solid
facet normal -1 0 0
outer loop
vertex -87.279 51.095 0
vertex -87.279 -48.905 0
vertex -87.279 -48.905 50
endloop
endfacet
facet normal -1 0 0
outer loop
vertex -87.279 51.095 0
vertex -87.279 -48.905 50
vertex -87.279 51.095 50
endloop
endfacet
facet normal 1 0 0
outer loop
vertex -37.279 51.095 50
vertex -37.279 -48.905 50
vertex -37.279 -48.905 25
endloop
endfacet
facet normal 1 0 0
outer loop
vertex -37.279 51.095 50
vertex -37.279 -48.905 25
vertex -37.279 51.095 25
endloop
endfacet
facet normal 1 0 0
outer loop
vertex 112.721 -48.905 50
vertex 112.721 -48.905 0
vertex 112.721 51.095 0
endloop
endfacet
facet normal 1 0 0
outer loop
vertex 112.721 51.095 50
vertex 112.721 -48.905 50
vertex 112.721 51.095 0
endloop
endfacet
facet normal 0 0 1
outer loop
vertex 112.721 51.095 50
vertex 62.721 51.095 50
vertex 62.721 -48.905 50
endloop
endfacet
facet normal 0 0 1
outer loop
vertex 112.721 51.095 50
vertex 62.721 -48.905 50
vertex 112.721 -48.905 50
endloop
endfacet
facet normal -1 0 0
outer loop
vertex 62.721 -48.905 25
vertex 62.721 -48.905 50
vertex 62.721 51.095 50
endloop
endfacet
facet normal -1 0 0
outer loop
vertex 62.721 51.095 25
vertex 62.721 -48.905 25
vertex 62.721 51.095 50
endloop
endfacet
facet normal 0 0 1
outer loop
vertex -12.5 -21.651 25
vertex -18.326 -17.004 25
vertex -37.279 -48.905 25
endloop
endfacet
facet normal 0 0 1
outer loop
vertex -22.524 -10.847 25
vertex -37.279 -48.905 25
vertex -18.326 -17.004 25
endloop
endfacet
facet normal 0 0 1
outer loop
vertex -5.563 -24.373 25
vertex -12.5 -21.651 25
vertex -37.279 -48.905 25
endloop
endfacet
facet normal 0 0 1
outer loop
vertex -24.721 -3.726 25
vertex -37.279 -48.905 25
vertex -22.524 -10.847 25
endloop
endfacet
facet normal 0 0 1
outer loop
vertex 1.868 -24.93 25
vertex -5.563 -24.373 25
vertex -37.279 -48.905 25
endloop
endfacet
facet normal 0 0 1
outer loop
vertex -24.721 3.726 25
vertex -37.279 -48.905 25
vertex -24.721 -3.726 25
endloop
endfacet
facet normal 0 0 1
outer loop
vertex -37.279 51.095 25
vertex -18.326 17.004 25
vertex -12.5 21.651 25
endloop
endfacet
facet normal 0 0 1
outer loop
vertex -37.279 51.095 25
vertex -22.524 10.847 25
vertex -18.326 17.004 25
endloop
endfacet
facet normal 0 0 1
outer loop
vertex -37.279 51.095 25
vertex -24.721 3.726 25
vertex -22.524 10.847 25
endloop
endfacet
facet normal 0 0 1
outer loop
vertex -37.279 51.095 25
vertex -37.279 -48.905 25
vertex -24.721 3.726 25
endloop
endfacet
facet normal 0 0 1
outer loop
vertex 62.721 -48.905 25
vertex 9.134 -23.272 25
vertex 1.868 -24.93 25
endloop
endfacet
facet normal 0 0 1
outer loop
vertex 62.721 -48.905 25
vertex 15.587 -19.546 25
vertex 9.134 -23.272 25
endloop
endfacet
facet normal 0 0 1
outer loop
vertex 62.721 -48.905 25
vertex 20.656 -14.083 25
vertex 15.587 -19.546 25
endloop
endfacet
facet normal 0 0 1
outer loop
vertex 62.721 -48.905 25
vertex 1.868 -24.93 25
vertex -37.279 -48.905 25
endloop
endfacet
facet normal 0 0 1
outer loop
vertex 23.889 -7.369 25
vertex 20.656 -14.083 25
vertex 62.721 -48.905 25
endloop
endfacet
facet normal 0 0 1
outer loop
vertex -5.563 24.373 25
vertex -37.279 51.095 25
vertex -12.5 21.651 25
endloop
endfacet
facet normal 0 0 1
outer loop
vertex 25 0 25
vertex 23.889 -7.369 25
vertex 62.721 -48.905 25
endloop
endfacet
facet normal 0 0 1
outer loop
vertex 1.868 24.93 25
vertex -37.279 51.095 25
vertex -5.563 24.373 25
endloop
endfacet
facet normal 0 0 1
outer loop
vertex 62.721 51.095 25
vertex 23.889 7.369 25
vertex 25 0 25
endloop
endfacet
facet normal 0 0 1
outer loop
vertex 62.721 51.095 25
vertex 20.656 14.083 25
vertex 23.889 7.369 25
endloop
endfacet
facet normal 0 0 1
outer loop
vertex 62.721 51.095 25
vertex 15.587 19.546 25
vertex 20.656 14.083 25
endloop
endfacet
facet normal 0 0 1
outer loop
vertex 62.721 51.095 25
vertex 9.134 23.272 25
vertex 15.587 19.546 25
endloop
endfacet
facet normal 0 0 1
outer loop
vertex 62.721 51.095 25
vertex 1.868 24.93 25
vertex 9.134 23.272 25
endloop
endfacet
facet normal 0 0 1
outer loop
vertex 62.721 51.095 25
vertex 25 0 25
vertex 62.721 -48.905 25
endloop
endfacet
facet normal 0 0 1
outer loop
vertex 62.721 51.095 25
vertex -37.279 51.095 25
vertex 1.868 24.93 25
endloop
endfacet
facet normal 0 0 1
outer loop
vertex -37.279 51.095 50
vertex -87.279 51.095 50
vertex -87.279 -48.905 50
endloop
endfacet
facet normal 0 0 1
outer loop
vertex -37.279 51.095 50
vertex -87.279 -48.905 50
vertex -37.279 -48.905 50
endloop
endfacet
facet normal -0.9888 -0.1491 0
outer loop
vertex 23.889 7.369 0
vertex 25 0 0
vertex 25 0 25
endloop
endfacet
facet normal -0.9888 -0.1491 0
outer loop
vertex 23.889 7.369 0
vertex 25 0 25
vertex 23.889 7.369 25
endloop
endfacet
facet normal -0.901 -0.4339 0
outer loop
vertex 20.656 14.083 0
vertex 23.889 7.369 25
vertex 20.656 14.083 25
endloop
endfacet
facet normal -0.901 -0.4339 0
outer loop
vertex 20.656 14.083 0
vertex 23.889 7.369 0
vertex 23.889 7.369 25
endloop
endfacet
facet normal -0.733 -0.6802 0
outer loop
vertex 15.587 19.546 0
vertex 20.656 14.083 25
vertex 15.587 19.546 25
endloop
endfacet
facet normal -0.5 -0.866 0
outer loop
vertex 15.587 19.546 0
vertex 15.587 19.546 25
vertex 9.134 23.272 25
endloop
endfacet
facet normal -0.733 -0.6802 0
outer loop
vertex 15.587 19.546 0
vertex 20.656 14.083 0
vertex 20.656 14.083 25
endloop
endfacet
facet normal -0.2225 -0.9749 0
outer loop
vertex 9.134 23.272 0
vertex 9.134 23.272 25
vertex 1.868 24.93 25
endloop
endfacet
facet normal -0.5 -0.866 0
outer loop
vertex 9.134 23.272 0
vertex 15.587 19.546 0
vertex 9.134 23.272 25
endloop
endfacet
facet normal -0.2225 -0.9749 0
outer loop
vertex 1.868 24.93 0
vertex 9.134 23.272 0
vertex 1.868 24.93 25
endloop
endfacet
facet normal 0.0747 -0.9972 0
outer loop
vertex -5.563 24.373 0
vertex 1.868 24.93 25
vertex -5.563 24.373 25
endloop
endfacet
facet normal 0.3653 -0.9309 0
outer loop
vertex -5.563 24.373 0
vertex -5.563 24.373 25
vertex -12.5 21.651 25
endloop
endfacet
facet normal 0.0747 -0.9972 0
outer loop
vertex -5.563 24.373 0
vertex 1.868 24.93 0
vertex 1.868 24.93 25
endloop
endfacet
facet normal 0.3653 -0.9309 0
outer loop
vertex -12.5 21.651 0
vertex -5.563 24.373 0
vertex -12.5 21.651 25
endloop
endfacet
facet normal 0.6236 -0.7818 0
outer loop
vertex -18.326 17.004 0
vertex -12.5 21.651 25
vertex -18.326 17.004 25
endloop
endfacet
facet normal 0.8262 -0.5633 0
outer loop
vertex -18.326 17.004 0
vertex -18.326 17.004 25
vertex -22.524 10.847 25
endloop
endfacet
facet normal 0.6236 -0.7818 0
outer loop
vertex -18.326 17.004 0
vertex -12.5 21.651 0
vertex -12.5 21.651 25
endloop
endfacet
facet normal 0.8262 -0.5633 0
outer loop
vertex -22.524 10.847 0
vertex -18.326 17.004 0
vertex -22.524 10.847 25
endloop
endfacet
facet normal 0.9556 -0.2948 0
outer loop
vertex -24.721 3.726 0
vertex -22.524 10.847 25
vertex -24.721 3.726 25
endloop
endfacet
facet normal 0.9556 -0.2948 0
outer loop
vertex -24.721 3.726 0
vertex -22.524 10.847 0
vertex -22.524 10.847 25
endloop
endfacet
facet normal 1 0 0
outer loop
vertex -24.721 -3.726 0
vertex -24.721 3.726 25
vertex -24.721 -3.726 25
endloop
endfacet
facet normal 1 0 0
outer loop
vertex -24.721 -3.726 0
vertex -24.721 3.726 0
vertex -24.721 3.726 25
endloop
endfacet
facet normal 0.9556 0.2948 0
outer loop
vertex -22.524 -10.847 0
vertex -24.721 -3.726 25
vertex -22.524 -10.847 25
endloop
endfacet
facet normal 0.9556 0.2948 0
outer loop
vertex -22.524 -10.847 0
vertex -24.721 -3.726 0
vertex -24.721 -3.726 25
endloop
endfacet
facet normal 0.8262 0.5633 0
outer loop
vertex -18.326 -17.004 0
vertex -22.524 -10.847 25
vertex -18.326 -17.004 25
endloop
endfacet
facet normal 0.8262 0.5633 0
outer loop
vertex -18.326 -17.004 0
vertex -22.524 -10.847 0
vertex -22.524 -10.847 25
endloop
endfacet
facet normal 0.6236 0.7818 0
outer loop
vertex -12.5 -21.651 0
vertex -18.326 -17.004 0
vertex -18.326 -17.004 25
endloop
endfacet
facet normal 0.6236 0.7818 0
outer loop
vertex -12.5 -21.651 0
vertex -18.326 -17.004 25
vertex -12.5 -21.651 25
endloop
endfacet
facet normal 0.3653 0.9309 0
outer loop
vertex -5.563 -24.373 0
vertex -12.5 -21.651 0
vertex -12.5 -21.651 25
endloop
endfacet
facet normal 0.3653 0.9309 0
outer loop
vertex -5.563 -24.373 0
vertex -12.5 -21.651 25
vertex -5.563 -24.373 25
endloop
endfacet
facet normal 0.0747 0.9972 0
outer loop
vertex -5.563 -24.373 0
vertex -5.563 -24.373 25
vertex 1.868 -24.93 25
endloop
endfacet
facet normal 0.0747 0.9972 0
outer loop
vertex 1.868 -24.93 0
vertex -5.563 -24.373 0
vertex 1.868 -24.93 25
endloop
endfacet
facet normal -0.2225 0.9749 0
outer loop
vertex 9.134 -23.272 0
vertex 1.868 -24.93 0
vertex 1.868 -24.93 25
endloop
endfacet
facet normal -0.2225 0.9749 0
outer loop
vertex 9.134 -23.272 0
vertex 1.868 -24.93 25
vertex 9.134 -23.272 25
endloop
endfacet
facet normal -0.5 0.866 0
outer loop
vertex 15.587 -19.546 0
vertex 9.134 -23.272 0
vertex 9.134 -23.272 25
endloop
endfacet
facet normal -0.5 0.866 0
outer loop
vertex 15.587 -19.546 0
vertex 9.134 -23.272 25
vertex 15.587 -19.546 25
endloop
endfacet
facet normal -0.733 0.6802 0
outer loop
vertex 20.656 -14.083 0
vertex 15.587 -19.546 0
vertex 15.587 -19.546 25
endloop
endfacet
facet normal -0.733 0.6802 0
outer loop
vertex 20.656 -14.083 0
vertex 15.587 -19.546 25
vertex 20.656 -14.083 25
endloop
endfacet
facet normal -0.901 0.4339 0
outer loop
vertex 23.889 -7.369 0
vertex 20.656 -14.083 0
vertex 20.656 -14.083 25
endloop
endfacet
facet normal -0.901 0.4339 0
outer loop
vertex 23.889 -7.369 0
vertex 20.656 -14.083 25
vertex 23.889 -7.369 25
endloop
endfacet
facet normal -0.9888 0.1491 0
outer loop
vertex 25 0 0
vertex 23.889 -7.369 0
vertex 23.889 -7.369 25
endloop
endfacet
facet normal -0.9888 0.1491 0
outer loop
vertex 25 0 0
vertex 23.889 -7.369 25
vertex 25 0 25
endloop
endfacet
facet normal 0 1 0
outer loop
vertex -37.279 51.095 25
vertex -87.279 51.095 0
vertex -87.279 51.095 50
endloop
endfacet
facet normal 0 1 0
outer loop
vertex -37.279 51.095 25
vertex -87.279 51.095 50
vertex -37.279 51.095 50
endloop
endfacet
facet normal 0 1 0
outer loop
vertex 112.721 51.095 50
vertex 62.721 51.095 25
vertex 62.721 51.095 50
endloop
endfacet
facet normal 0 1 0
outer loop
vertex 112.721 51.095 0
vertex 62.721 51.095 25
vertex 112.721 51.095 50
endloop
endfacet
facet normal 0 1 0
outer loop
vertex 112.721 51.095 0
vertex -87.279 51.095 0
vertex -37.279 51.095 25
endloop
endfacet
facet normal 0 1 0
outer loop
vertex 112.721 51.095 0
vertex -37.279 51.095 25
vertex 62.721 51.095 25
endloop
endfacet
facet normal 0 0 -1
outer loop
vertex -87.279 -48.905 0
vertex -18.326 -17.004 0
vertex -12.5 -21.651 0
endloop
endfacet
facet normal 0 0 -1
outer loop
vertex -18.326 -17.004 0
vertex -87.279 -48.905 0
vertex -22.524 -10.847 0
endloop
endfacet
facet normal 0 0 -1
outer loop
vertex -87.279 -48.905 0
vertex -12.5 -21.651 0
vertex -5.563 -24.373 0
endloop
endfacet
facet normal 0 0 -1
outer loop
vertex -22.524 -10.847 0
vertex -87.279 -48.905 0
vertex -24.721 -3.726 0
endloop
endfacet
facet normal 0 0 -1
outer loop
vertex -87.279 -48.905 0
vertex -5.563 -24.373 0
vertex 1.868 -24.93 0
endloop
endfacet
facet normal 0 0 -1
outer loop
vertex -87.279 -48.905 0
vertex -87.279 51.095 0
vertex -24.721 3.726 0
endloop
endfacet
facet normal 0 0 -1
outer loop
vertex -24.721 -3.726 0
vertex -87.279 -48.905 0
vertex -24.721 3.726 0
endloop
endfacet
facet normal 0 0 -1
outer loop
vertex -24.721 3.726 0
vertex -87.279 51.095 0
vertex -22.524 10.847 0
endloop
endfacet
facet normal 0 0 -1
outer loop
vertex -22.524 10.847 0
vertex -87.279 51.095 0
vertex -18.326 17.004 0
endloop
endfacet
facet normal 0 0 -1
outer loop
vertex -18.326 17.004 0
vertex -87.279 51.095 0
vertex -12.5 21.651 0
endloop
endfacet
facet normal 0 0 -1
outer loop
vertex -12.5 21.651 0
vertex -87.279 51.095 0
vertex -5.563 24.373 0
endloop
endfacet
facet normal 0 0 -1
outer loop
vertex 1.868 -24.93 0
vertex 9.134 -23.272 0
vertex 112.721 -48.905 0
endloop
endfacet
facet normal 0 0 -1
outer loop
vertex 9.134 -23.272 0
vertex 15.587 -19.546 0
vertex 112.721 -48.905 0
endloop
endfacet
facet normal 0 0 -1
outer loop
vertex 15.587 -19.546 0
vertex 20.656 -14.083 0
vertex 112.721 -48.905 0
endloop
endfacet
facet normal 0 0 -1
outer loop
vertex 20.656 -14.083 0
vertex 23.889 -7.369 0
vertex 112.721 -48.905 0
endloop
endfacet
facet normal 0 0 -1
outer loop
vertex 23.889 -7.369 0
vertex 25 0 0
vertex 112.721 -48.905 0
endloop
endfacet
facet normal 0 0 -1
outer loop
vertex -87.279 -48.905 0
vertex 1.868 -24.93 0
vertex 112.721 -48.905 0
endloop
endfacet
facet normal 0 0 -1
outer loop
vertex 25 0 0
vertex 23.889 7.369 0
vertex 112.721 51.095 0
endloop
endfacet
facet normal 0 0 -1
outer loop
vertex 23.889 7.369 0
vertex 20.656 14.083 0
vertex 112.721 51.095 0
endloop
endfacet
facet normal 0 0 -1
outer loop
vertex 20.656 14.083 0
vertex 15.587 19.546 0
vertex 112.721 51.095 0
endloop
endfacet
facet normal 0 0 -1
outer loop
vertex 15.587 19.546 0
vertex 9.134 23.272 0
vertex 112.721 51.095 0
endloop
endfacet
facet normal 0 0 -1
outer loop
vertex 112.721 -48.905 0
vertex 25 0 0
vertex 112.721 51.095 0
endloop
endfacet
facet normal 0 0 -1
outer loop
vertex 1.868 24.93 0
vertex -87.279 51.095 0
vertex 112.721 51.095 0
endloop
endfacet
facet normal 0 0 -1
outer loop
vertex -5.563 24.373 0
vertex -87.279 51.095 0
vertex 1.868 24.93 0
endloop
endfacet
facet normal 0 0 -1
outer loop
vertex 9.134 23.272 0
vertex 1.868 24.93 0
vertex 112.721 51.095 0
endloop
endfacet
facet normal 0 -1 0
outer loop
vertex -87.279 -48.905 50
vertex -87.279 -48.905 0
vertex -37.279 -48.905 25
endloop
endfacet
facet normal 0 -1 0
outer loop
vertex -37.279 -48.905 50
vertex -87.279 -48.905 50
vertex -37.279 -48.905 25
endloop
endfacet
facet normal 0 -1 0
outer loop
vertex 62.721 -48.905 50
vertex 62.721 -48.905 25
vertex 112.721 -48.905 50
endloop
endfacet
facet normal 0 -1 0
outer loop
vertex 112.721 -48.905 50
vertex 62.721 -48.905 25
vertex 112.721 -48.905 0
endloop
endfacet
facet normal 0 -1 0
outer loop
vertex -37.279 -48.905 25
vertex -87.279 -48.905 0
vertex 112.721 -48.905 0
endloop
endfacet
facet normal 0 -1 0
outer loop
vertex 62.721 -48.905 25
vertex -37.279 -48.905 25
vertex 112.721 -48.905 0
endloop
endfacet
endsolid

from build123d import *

# Parameters (mm, degrees)
F0_W     = 200
F0_H     = 100
F0_R     = 25
F1_DEPTH = 50
F2_W     = 100
F2_H     = 100
F2_R     = 25
F3_DEPTH = 25


# Not quite as in the source:
# - a feature names something its author has since deleted; it is built from what else it names


with BuildPart() as f1:
    # F0 (on Top) → F1 (new body)
    with BuildSketch(Plane.XY):
        with Locations((12.7213582092, 1.0950192809)):
            Rectangle(F0_W, F0_H)
        Circle(F0_R, mode=Mode.SUBTRACT)
    extrude(amount=F1_DEPTH)

    # F2 (on face) → F3 (cut)
    with BuildSketch(Plane.XY.offset(50)):
        with Locations((12.7213582092, 1.0950192809)):
            Rectangle(F2_W, F2_H)
        Circle(F2_R, mode=Mode.SUBTRACT)
    extrude(amount=-F3_DEPTH, mode=Mode.SUBTRACT)


solid = f1.part
